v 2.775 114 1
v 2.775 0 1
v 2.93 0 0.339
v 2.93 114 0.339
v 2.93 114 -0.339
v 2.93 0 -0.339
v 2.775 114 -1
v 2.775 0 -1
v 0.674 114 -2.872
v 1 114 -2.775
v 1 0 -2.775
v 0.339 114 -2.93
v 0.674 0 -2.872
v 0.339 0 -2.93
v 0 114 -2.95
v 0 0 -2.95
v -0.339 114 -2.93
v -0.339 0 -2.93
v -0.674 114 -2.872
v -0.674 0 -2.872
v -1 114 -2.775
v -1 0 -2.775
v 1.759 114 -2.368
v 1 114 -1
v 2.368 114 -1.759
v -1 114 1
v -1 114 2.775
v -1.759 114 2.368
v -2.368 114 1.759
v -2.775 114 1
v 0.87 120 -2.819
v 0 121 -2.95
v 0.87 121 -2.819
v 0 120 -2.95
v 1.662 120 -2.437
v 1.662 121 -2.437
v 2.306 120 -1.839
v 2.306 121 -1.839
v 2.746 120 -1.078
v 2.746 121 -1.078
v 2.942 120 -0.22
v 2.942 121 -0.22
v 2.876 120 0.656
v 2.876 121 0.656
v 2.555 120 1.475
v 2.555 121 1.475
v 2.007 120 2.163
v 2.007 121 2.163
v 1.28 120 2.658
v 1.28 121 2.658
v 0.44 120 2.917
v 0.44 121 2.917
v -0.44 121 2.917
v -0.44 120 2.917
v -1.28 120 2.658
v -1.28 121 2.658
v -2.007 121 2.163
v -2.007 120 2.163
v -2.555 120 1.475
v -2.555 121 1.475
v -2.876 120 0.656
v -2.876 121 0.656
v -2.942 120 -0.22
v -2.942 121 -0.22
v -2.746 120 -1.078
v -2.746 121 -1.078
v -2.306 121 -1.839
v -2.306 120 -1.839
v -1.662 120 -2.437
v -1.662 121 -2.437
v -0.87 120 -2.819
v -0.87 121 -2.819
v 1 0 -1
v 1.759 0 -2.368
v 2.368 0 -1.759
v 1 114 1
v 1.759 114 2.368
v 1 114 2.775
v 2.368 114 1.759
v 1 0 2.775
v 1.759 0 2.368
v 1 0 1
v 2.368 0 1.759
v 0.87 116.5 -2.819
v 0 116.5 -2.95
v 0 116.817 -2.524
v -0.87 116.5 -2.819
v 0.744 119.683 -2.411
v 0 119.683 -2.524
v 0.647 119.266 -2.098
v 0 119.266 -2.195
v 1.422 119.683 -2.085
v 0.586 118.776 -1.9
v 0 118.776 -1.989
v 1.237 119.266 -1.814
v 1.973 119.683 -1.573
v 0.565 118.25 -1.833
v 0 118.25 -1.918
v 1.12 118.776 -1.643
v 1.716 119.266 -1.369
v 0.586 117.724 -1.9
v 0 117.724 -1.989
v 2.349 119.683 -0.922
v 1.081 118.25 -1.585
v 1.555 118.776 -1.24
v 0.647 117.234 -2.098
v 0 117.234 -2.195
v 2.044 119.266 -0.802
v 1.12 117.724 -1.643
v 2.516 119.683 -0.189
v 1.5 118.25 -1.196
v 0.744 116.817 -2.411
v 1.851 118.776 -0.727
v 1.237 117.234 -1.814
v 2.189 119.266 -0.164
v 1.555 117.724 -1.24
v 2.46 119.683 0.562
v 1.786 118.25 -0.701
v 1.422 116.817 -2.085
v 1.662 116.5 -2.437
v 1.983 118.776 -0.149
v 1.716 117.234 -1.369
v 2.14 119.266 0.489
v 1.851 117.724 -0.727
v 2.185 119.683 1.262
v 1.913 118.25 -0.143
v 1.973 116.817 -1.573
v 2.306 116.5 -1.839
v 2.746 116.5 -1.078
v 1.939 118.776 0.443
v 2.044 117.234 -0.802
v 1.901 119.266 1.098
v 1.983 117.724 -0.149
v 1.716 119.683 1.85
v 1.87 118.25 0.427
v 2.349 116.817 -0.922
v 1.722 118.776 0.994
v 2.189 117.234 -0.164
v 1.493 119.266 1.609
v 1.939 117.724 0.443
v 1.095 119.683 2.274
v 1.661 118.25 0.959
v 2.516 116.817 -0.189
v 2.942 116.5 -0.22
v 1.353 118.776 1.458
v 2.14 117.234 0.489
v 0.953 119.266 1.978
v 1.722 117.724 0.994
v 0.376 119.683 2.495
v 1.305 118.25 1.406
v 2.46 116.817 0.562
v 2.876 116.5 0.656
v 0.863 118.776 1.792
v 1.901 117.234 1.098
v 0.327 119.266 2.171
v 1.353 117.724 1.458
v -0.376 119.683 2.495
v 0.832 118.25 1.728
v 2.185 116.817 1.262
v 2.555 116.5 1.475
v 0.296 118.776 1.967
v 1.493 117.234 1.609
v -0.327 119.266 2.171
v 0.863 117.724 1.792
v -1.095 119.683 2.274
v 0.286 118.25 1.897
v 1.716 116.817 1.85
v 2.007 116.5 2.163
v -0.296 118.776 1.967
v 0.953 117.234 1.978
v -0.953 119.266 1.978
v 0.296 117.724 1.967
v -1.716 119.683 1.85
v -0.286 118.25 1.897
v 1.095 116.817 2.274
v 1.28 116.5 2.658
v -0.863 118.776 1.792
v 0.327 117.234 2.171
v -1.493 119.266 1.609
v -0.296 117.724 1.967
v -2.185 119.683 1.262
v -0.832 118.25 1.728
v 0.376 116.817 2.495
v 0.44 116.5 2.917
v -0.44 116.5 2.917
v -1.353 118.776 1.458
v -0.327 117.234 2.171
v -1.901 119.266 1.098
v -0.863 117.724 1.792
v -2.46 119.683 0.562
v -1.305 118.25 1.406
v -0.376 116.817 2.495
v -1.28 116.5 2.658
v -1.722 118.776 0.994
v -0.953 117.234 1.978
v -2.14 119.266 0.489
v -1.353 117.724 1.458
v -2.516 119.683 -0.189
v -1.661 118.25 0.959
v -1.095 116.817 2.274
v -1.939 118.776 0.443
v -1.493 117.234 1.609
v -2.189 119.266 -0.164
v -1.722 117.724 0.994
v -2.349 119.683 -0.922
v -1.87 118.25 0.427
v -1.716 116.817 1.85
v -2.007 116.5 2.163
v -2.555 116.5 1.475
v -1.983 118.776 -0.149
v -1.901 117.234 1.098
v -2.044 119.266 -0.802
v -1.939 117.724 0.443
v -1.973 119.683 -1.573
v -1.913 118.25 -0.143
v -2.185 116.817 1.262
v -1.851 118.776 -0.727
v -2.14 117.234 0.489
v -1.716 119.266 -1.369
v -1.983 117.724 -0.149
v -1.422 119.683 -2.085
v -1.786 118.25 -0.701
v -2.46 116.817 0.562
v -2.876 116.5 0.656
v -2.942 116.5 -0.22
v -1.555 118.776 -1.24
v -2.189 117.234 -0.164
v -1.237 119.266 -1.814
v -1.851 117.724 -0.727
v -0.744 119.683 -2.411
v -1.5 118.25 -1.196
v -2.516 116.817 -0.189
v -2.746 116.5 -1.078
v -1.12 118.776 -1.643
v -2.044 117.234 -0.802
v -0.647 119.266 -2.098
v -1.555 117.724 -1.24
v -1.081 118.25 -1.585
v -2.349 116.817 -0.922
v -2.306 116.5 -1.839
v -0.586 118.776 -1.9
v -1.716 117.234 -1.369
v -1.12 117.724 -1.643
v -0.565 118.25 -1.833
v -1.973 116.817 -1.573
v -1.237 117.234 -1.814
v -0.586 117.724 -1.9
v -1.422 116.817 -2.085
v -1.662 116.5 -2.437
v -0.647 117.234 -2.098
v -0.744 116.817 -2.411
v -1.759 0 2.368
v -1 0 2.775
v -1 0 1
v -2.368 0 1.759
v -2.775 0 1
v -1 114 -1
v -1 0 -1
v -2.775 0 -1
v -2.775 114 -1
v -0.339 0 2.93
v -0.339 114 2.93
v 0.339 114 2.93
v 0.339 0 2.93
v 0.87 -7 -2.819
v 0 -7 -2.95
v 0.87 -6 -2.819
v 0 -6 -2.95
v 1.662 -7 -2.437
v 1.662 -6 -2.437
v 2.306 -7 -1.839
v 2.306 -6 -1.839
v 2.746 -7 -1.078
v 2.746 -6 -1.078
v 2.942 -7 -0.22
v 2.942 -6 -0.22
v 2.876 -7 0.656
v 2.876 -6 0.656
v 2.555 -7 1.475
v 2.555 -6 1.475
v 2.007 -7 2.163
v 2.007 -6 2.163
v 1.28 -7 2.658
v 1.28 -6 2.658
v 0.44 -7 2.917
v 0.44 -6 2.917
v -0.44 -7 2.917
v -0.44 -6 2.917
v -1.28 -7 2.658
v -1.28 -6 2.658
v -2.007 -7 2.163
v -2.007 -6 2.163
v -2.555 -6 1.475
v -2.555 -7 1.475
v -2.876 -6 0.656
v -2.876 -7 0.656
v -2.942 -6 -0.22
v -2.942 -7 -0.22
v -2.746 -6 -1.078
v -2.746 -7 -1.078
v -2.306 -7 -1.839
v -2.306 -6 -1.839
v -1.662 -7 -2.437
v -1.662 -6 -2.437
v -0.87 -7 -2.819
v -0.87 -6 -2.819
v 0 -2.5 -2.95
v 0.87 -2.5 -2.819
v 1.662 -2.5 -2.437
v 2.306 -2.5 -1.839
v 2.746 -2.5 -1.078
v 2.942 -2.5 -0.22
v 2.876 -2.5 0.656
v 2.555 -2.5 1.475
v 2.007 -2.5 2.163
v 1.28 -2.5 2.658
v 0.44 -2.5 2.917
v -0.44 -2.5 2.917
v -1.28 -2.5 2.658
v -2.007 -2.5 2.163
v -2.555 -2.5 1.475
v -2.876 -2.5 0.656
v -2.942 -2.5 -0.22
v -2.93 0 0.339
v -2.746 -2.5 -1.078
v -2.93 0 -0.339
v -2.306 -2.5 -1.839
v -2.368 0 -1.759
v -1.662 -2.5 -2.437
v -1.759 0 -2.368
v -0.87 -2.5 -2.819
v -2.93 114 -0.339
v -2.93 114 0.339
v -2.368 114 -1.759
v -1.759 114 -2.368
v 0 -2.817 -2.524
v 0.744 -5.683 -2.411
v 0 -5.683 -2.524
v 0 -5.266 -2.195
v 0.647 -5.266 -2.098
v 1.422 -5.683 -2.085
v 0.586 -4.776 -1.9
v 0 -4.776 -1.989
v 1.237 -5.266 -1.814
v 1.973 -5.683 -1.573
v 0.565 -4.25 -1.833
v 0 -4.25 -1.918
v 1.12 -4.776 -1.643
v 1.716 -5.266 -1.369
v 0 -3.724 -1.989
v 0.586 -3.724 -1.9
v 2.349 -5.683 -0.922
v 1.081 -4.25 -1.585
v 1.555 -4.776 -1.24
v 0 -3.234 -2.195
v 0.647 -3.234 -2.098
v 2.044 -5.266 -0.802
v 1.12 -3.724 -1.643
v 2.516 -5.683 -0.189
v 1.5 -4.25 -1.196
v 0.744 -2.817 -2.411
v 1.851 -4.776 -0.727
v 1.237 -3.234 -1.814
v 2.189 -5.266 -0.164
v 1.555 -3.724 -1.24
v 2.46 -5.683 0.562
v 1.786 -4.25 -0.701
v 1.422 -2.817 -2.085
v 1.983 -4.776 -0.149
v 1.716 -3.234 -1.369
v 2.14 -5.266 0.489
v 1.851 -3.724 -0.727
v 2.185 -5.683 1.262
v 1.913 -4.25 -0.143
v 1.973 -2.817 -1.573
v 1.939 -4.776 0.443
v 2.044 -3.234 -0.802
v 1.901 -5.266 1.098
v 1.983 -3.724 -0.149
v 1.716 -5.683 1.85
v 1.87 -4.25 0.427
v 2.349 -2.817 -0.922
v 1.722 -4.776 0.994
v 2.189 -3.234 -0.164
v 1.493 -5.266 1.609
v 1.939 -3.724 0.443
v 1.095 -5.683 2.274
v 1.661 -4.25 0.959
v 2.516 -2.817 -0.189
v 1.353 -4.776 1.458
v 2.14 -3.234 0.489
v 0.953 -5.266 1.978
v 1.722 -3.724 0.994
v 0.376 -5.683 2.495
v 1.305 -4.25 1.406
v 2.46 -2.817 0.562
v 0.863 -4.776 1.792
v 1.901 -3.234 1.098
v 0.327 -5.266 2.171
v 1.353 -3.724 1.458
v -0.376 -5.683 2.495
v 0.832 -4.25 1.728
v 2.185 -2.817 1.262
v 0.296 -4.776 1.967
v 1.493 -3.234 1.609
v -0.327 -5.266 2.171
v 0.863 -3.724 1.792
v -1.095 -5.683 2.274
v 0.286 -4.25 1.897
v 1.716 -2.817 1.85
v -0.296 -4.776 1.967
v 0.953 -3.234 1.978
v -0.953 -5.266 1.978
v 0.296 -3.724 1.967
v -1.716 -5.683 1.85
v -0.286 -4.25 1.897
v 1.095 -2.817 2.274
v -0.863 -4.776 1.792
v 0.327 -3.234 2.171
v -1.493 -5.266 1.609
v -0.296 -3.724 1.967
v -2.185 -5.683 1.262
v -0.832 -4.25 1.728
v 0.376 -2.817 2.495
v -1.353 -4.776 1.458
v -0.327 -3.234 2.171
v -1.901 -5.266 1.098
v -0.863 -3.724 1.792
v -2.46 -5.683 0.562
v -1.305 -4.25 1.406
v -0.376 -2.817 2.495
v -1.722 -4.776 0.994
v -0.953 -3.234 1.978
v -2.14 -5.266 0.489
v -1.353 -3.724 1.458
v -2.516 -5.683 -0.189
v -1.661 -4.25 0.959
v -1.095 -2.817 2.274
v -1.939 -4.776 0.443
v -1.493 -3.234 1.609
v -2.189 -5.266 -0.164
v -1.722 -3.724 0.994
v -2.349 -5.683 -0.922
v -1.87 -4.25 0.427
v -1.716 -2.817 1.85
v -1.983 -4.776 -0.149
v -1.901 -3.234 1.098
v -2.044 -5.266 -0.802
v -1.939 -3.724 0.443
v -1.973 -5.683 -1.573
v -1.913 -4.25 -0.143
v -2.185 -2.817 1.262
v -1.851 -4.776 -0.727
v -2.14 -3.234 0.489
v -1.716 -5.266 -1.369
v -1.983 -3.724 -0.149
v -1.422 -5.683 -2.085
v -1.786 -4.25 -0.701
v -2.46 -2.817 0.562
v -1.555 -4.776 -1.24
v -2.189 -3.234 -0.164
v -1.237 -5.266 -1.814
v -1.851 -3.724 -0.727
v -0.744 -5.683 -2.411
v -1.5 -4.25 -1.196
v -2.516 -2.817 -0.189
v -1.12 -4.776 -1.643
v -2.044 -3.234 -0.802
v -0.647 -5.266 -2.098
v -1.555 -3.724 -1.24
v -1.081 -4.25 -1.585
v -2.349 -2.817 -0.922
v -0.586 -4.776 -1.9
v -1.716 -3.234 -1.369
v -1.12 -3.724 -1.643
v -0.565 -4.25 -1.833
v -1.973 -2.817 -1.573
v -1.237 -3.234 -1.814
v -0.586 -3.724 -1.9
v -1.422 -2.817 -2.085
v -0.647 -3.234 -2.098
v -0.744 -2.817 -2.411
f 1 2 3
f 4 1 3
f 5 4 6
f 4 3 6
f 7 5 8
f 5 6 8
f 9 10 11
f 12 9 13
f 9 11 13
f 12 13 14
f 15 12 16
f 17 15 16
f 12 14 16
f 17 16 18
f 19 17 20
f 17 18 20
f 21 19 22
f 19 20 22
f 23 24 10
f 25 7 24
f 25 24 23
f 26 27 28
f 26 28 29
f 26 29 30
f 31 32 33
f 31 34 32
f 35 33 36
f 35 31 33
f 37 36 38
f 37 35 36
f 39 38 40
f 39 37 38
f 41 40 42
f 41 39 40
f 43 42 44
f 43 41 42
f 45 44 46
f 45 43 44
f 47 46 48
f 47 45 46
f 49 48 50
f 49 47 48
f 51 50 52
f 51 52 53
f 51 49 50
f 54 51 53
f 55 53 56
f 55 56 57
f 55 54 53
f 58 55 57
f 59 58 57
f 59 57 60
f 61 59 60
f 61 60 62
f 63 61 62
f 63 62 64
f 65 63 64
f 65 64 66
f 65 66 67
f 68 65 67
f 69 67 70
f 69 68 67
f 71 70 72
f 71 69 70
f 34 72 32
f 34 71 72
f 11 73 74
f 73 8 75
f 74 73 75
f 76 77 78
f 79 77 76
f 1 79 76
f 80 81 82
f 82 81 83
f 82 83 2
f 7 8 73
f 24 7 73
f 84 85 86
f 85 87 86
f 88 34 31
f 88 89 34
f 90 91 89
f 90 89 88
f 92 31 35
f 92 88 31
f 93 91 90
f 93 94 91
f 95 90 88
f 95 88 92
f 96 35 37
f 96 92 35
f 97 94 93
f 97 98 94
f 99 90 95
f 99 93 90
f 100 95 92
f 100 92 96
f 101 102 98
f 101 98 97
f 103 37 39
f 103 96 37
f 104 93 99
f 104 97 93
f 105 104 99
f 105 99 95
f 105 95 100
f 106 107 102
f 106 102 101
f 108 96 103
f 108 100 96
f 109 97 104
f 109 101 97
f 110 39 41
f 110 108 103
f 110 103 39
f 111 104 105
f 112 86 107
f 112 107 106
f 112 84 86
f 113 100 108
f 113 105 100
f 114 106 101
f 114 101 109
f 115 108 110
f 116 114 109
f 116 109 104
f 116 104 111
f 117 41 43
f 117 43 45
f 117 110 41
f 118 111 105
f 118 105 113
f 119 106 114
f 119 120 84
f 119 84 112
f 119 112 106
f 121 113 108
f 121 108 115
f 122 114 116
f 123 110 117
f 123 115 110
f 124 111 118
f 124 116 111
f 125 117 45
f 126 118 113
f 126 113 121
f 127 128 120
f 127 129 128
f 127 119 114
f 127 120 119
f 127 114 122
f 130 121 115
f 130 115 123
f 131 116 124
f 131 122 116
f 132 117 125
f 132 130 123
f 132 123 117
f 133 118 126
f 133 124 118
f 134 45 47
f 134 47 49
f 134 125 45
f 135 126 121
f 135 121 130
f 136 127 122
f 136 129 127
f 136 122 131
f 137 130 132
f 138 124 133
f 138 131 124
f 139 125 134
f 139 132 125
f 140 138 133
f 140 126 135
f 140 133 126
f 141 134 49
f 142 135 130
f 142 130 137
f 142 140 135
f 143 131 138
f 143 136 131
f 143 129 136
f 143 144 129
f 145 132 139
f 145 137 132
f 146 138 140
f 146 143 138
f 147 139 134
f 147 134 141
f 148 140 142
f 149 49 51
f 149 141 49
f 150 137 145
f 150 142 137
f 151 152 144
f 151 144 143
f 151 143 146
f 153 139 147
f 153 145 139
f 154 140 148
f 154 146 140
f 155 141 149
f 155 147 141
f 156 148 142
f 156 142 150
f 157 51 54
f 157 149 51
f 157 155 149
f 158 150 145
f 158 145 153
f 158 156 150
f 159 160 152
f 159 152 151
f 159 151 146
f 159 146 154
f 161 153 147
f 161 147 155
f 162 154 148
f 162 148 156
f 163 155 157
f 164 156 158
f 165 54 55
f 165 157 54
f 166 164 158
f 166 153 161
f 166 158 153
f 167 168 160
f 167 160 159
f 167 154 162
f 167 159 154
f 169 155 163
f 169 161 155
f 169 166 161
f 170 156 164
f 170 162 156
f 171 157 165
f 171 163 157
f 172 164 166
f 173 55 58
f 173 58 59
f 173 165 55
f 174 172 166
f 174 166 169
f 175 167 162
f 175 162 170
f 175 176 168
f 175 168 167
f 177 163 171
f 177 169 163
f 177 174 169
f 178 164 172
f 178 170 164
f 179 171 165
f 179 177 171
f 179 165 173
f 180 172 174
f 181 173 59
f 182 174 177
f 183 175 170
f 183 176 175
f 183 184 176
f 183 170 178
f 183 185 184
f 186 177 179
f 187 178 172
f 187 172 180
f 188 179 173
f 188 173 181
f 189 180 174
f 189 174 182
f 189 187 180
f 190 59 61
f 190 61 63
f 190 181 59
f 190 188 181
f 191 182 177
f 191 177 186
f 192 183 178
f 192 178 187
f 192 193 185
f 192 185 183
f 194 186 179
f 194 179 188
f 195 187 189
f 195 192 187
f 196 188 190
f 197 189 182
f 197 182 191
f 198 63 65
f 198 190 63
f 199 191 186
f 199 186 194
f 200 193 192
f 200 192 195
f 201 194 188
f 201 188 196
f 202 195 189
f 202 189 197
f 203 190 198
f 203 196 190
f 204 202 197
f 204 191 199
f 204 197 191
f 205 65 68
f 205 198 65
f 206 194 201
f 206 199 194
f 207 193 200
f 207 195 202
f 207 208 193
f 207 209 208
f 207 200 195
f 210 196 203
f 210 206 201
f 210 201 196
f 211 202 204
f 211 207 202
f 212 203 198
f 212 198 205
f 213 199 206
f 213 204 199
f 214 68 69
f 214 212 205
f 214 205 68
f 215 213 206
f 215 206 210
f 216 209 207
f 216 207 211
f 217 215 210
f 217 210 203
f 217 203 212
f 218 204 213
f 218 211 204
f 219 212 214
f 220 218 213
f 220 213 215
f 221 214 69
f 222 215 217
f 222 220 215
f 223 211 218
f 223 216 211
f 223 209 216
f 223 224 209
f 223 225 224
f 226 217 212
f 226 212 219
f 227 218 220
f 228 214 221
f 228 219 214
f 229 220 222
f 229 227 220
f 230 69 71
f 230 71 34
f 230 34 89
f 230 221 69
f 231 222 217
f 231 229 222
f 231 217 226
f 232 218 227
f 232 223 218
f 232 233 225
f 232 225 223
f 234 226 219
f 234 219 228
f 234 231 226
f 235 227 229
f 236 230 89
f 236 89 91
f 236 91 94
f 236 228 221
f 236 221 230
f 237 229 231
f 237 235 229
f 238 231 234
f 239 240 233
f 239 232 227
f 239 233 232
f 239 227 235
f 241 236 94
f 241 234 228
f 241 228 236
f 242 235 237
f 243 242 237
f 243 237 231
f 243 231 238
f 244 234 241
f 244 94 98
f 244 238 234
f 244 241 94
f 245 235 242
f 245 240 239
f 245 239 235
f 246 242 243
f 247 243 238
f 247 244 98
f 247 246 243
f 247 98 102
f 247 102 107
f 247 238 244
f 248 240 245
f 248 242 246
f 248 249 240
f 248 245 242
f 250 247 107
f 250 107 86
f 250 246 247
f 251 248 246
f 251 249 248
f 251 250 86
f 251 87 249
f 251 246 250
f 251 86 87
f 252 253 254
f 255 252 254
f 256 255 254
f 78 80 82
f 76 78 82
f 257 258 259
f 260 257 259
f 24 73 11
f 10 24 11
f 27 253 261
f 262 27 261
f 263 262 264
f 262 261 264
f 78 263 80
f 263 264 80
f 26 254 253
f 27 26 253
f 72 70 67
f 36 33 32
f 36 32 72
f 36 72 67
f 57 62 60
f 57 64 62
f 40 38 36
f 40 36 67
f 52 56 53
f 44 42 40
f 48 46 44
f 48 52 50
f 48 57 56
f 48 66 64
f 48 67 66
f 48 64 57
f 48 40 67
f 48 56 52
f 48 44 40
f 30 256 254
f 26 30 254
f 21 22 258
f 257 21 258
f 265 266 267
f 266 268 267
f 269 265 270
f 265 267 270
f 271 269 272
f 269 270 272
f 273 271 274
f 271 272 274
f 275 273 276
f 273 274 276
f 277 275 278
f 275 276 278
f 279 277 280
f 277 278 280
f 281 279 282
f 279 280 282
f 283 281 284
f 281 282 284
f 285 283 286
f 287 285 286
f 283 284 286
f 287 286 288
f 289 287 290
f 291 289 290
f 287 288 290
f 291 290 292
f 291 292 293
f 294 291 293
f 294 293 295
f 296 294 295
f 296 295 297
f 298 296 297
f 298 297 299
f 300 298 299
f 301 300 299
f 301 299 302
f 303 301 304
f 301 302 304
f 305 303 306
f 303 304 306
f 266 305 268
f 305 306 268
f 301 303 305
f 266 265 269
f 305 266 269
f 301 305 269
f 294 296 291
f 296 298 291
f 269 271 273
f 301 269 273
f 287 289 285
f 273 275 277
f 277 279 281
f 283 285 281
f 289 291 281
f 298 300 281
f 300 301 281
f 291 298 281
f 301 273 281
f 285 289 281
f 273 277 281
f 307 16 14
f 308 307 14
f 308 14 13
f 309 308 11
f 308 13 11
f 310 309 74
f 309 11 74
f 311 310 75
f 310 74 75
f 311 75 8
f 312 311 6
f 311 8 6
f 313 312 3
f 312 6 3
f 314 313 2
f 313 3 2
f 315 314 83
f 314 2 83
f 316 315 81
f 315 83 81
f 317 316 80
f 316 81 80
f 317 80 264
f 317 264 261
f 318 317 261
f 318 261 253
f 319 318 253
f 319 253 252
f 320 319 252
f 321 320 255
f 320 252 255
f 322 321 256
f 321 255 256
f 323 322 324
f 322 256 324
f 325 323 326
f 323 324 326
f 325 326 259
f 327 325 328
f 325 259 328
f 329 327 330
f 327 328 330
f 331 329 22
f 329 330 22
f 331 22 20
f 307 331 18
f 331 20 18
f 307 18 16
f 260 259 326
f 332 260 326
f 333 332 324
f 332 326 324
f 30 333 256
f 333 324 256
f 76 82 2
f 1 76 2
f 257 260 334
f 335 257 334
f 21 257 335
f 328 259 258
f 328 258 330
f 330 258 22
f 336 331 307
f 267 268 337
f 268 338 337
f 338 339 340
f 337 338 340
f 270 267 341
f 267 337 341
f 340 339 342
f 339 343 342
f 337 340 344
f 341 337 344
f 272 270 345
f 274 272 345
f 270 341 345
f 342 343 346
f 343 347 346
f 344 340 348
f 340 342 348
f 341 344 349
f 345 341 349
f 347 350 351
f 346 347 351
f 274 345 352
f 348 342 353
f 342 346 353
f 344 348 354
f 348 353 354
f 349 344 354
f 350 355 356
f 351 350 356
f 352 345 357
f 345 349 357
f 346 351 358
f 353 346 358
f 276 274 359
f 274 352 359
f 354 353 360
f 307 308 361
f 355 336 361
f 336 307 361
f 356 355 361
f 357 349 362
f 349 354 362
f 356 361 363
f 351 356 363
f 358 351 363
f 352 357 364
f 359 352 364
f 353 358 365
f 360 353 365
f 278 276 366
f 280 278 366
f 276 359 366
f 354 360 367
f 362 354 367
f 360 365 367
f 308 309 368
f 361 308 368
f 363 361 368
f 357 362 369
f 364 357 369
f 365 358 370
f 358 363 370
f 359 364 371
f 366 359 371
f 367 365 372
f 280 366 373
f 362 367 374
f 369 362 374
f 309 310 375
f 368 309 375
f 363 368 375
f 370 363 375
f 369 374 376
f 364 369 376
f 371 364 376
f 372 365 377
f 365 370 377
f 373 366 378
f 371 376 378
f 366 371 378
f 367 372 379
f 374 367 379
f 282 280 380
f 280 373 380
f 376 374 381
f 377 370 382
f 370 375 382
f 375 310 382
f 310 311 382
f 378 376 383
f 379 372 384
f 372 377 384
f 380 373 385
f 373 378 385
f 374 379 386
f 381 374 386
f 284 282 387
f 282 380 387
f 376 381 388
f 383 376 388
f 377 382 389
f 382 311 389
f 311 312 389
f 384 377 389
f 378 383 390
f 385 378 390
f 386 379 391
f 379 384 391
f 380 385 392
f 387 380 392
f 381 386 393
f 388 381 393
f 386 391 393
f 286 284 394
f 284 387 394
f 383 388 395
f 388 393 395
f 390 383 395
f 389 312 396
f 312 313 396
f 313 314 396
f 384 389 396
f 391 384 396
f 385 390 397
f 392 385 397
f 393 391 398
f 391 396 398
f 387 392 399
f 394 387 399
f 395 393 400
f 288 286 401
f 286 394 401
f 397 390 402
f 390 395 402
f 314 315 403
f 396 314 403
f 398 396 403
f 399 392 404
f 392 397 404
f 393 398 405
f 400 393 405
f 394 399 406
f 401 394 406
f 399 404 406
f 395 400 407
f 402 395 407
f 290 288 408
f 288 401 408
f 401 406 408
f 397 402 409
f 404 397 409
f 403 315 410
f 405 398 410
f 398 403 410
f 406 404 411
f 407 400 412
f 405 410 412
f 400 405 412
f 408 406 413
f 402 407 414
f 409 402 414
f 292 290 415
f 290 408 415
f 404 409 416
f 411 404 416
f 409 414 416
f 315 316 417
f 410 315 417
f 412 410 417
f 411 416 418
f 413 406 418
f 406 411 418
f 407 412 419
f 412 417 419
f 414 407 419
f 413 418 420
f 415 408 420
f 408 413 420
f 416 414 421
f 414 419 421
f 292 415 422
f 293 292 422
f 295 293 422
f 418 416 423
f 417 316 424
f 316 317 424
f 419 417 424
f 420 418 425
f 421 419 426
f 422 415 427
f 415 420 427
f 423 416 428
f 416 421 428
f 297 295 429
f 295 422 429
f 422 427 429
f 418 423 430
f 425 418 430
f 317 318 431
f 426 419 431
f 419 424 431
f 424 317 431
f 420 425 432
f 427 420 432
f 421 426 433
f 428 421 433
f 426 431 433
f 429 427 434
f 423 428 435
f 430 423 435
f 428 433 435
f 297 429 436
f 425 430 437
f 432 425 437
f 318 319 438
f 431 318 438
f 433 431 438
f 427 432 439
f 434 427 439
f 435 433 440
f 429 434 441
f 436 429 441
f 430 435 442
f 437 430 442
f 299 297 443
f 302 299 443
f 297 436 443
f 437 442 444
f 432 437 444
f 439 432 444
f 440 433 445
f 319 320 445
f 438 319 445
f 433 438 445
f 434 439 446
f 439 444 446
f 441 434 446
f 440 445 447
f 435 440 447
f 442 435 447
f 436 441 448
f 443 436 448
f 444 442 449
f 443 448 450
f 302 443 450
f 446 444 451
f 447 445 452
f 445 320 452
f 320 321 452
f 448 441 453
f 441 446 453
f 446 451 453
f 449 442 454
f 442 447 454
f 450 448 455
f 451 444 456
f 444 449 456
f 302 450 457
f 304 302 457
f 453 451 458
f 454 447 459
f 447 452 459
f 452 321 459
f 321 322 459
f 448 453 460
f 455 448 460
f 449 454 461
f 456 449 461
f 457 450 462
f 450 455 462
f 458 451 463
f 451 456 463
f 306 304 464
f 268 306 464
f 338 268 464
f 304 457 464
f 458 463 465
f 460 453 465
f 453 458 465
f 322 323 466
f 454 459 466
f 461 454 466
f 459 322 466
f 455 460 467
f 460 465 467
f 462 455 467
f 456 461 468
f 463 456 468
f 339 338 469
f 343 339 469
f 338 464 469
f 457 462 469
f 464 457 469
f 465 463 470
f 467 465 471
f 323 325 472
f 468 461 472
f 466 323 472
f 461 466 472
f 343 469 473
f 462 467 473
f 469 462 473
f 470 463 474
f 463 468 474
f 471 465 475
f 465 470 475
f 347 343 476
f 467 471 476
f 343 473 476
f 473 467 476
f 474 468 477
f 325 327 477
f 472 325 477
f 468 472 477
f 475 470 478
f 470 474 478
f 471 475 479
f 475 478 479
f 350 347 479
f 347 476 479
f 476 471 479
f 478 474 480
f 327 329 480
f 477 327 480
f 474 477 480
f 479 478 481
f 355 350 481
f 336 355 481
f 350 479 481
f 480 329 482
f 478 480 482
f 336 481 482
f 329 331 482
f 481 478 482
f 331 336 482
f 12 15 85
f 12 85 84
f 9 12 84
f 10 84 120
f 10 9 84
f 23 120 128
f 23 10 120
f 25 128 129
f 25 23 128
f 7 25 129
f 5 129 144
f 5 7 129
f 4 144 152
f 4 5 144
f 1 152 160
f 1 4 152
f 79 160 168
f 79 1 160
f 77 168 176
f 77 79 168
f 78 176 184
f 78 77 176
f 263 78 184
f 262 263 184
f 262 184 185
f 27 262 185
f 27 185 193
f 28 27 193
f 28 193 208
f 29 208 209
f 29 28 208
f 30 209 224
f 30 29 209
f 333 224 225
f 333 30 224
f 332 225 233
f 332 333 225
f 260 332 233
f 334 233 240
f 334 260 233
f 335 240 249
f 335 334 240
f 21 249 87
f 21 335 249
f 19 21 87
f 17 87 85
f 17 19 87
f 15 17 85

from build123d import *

# Parameters (mm, degrees)
EXTRUDE_2_DEPTH = 114


with BuildPart() as part:
    # 草图1 → 凸台-拉伸2 (new body)
    with BuildSketch(Plane(origin=(0, 0, 0), x_dir=(1, 0, 0), z_dir=(0, 1, 0))):
        with BuildLine():
            Line((1, 1), (1, 2.775338))
            ThreePointArc((1, 2.775338), (0, 2.95), (-1, 2.775338))
            Line((-1, 2.775338), (-1, 1))
            Line((-1, 1), (-2.775338, 1))
            ThreePointArc((-2.775338, 1), (-2.95, 0), (-2.775338, -1))
            Line((-2.775338, -1), (-1, -1))
            Line((-1, -1), (-1, -2.775338))
            ThreePointArc((-1, -2.775338), (0, -2.95), (1, -2.775338))
            Line((1, -2.775338), (1, -1))
            Line((1, -1), (2.775338, -1))
            ThreePointArc((2.775338, -1), (2.95, 0), (2.775338, 1))
            Line((2.775338, 1), (1, 1))
        make_face()
    extrude(amount=EXTRUDE_2_DEPTH)

    # 草图3 → 旋转3 (revolve)
    with BuildSketch(Plane(origin=(0, 0, 0), x_dir=(0, 0, -1), z_dir=(1, 0, 0))):
        with BuildLine():
            Line((0, 114), (0, 121))
            Line((0, 121), (2.95, 121))
            Line((2.95, 121), (2.95, 120))
            ThreePointArc((2.95, 120), (1.918246, 118.25), (2.95, 116.5))
            Line((2.95, 116.5), (2.95, 114))
            Line((2.95, 114), (0, 114))
        make_face()
        with BuildLine():
            Line((0, 0), (0, -7))
            Line((0, -7), (2.95, -7))
            Line((2.95, -7), (2.95, -6))
            ThreePointArc((2.95, -6), (1.918246, -4.25), (2.95, -2.5))
            Line((2.95, -2.5), (2.95, 0))
            Line((2.95, 0), (0, 0))
        make_face()
    revolve(axis=Axis((0, 0, 0), (0, -1, 0)))


solid = part.part
